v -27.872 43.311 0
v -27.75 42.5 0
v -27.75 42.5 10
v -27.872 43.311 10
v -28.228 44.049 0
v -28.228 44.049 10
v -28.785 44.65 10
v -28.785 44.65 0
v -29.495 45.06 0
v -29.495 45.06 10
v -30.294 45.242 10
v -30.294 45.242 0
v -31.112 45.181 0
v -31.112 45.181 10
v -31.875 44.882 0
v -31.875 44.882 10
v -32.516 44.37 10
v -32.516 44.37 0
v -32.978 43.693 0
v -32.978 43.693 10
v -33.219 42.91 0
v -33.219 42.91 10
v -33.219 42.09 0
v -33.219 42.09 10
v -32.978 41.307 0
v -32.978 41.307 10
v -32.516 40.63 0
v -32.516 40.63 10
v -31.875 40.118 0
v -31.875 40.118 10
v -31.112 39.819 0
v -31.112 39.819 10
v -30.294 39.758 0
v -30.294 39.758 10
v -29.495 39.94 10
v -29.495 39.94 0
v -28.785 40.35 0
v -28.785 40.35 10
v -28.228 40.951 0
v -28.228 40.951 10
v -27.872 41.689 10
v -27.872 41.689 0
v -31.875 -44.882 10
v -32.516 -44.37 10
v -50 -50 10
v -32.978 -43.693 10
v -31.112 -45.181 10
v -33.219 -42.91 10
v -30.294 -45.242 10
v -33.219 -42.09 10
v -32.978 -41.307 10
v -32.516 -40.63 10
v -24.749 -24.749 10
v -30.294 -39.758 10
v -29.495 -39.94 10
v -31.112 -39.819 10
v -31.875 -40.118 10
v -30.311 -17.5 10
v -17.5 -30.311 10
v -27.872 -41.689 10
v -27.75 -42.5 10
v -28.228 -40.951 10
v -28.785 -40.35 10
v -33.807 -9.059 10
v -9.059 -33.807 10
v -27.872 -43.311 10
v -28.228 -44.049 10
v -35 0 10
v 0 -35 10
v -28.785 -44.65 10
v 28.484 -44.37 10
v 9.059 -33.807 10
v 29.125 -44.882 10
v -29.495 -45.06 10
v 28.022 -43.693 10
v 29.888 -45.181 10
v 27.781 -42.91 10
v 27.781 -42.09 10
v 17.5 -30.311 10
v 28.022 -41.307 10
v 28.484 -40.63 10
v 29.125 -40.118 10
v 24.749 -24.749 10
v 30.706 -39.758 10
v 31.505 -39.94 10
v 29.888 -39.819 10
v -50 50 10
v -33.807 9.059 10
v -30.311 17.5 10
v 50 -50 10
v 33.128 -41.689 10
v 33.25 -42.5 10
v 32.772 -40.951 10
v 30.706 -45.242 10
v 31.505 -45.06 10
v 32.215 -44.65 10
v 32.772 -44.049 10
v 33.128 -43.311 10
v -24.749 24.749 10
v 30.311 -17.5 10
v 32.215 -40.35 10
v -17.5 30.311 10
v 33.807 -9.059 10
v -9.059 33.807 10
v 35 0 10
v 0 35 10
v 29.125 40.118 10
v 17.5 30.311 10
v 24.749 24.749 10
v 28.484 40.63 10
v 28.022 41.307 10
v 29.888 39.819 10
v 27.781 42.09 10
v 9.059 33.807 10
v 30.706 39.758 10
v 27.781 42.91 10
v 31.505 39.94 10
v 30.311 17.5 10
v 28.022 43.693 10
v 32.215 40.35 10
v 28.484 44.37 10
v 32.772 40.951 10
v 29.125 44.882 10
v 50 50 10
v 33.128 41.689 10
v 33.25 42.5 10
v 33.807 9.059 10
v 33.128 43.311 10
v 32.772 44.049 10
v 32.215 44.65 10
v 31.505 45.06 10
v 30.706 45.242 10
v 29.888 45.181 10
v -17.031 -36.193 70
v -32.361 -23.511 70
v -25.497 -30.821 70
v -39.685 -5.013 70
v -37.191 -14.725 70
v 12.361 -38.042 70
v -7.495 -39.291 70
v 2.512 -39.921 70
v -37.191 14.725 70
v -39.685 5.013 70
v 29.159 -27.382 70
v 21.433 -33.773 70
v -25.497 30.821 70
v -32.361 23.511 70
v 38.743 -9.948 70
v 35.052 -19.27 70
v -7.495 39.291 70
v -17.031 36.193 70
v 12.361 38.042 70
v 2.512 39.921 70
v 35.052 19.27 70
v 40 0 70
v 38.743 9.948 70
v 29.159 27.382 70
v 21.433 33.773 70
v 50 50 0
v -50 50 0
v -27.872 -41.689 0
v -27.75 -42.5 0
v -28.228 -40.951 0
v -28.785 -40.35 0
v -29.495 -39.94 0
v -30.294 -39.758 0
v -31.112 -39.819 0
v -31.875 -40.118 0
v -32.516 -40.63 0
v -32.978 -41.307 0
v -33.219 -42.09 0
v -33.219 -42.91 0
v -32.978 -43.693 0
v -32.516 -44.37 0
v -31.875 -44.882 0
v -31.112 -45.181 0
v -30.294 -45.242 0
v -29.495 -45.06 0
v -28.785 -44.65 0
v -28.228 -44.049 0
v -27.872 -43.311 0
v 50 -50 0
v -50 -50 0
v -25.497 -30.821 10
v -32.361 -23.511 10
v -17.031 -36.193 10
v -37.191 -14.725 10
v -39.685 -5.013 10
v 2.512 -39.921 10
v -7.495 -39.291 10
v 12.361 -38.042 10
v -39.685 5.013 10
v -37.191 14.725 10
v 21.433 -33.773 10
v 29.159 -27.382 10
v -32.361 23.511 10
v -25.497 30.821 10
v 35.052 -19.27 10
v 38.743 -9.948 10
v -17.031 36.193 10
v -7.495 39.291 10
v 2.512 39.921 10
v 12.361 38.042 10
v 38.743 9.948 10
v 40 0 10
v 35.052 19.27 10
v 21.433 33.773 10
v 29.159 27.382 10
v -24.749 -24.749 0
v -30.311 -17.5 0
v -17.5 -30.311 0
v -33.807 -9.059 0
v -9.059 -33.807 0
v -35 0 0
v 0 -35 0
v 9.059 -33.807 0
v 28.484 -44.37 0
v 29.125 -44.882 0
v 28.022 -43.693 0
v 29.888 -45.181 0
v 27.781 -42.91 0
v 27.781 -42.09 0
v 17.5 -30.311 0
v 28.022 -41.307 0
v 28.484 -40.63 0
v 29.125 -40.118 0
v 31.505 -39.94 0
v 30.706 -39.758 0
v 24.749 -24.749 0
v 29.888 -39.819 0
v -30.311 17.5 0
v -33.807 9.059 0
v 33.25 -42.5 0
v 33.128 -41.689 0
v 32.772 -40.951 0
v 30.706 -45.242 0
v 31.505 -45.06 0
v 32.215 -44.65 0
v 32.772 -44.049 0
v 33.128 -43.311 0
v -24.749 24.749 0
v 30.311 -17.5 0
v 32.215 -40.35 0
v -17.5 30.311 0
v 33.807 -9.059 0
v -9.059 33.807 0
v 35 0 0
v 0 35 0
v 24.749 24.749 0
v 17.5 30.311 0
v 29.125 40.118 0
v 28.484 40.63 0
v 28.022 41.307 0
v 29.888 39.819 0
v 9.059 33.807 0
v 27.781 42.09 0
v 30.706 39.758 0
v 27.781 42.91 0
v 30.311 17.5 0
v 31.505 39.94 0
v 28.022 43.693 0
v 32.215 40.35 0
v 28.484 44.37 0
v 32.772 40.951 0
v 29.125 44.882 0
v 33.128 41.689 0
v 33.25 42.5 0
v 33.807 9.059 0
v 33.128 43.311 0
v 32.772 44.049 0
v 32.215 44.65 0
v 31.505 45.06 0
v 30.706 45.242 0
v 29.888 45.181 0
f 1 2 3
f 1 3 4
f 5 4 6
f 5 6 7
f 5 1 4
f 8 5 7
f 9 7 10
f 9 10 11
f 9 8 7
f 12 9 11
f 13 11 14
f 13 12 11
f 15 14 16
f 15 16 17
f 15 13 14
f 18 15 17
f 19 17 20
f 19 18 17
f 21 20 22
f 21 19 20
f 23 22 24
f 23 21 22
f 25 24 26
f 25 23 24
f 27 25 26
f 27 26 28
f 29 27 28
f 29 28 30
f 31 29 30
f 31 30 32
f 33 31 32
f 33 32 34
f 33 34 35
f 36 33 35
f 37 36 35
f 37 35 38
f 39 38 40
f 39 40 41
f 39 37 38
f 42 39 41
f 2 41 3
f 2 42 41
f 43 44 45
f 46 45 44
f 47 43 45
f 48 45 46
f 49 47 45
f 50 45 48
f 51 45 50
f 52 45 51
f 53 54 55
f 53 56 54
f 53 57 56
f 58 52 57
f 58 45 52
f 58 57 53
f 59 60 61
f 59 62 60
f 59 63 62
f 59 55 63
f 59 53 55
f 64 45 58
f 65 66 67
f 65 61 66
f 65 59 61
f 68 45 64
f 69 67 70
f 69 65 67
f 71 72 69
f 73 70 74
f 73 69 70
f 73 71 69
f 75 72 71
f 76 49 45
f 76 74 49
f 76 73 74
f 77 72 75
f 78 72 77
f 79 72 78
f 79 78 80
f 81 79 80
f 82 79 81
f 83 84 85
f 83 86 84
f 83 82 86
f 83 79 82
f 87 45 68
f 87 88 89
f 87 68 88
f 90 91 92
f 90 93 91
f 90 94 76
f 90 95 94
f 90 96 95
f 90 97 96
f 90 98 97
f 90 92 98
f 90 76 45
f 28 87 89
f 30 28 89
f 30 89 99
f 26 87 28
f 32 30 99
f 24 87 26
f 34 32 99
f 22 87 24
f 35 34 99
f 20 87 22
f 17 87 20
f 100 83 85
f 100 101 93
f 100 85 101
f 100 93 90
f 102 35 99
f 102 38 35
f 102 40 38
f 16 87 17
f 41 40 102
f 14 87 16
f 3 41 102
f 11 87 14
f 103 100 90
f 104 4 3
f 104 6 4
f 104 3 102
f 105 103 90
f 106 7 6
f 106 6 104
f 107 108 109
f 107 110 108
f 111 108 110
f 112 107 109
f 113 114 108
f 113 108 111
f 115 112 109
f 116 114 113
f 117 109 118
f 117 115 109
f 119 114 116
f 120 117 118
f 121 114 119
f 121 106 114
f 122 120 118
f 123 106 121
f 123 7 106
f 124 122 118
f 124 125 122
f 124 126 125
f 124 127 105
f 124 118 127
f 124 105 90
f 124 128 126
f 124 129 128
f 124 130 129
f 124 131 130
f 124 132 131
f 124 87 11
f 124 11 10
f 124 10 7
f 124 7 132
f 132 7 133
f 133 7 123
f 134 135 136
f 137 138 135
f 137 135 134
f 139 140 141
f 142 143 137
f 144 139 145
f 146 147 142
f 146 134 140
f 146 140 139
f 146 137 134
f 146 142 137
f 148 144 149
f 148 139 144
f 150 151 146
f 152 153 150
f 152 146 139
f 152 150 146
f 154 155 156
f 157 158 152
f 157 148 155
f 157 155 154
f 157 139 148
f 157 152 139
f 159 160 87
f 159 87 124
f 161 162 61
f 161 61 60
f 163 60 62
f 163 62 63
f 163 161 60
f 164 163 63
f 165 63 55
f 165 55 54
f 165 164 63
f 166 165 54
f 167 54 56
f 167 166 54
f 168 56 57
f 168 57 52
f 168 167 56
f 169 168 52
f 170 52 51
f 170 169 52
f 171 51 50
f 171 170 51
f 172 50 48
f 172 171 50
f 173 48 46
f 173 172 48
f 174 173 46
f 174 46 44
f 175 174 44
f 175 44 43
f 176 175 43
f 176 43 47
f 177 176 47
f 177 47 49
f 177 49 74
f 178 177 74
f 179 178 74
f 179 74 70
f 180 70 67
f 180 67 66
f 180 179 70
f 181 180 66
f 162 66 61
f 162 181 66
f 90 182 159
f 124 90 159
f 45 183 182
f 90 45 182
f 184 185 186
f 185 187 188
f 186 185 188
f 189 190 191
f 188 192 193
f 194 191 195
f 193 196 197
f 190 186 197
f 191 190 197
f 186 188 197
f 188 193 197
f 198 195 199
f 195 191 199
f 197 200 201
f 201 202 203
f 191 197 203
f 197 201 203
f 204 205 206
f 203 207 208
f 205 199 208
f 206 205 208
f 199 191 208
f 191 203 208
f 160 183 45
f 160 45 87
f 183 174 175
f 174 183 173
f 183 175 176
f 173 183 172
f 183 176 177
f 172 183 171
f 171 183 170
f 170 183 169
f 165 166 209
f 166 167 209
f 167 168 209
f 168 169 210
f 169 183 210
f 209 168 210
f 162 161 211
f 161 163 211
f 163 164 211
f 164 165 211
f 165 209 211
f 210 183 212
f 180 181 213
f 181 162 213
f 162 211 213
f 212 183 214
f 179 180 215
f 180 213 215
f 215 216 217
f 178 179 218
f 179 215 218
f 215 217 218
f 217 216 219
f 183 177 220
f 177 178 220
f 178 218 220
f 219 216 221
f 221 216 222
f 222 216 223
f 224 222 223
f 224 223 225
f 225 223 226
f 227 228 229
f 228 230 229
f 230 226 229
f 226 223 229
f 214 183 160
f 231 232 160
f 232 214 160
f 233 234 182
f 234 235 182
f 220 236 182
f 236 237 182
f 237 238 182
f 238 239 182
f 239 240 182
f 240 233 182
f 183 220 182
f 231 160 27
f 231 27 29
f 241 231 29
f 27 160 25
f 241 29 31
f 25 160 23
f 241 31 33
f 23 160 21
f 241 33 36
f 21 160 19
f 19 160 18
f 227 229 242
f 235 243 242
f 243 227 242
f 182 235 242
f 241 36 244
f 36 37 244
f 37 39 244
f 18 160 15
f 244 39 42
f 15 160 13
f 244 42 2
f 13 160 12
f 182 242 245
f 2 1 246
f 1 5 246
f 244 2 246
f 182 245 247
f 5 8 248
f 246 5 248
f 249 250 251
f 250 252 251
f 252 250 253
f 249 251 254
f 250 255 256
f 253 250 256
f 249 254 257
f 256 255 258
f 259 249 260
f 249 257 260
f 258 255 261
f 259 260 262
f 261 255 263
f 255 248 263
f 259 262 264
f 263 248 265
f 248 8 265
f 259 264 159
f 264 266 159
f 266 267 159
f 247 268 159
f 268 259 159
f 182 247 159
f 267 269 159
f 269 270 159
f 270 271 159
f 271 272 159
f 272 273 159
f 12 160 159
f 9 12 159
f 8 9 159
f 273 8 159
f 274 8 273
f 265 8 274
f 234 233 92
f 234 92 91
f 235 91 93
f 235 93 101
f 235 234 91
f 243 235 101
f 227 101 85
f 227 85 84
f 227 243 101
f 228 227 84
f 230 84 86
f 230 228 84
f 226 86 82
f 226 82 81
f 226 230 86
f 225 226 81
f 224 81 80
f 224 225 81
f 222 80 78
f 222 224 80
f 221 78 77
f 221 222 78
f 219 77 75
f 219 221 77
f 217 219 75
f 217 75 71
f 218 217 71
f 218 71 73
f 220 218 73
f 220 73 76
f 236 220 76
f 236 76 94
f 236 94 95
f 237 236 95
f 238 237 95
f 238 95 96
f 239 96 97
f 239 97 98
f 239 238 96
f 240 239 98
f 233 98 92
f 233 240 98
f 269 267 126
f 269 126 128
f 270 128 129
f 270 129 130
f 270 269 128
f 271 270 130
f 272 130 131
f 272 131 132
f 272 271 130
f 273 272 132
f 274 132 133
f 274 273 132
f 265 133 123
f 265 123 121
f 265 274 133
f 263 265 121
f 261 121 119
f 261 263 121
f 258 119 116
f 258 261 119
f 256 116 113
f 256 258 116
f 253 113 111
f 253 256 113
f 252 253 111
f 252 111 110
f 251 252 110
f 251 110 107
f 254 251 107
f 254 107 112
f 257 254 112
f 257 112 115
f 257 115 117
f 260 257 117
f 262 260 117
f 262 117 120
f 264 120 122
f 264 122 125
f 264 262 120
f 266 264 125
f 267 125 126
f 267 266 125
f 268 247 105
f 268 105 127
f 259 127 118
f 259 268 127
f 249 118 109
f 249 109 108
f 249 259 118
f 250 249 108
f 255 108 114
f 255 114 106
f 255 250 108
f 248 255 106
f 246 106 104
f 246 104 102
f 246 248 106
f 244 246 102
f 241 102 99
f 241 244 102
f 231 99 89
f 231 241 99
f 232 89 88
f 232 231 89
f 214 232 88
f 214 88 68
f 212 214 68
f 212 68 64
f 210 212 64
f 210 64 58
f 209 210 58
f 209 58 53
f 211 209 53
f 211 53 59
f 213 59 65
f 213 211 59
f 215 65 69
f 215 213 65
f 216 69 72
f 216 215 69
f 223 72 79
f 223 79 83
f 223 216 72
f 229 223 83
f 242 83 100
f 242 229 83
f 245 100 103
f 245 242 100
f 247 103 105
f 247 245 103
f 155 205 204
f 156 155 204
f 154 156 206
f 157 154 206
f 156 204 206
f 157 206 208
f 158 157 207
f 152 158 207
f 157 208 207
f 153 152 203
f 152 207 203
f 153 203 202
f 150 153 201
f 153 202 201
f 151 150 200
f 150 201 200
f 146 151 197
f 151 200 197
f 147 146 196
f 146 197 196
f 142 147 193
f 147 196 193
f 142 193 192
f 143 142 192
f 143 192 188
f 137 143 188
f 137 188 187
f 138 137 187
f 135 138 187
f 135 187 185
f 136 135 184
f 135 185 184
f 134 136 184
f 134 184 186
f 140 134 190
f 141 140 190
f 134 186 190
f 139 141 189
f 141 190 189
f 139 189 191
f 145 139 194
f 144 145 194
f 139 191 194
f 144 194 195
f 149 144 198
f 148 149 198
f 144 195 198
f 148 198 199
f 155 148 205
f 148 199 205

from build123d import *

# Parameters (mm, degrees)
F0_W     = 100
F0_H     = 100
F0_R     = 2.75
F0_R_2   = 35
F1_DEPTH = 10
F2_R     = 40
F2_R_2   = 35
F3_DEPTH = 60


with BuildPart() as f1:
    # F0 (on Top) → F1 (new body)
    with BuildSketch(Plane.XY):
        Rectangle(F0_W, F0_H)
        with Locations((-30.5, -42.5)):
            Circle(F0_R, mode=Mode.SUBTRACT)
        with Locations((30.5, -42.5)):
            Circle(F0_R, mode=Mode.SUBTRACT)
        with Locations((-30.5, 42.5)):
            Circle(F0_R, mode=Mode.SUBTRACT)
        Circle(F0_R_2, mode=Mode.SUBTRACT)
        with Locations((30.5, 42.5)):
            Circle(F0_R, mode=Mode.SUBTRACT)
    extrude(amount=F1_DEPTH)


with BuildPart() as f3:
    # F2 (on face) → F3 (new body)
    with BuildSketch(Plane.XY.offset(10)):
        Circle(F2_R)
        Circle(F2_R_2, mode=Mode.SUBTRACT)
        Circle(F2_R_2)
    extrude(amount=F3_DEPTH)


solid = Compound([f1.part, f3.part])
